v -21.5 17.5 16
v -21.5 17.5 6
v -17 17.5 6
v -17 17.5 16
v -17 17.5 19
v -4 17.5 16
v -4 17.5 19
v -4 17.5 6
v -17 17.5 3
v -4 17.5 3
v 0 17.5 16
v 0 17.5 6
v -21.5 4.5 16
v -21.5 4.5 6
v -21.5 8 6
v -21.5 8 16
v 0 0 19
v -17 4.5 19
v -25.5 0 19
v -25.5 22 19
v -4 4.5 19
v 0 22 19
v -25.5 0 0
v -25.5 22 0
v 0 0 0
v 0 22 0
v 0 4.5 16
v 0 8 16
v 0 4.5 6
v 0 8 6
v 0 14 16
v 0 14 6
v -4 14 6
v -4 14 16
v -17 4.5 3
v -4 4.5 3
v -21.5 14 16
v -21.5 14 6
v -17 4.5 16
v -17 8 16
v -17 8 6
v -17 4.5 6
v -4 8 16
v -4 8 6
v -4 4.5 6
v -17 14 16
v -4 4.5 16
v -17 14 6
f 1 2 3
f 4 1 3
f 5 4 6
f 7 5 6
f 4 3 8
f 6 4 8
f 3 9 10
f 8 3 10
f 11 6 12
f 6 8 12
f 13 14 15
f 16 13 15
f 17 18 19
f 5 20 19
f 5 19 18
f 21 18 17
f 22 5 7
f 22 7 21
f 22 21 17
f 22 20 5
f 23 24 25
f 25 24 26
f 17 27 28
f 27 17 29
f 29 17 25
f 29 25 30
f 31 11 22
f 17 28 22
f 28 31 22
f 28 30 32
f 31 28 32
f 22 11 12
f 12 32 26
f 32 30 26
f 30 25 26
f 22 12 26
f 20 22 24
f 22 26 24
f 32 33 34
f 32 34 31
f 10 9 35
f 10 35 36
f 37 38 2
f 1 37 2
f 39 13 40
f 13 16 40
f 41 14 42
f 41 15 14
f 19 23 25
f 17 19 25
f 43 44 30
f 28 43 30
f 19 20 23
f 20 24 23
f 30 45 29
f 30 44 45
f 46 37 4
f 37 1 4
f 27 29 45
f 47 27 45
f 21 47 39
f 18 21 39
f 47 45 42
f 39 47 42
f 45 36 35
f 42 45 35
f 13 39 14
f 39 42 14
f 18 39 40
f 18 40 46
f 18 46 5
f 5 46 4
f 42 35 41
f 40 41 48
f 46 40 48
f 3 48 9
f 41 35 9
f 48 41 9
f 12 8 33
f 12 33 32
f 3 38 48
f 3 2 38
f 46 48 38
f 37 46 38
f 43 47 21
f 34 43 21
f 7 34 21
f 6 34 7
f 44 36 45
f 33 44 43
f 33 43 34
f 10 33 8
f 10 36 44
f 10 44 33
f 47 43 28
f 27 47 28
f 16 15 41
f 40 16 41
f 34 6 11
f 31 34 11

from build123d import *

# Parameters (mm, degrees)
F0_W     = 4.5
F0_H     = 3
F1_DEPTH = 16
F2_DEPTH = 6
F3_DEPTH = 3
F0_W_2   = 4
F4_DEPTH = 16
F5_W     = 4.5
F5_H     = 3.5
F5_W_2   = 4
F5_H_2   = 13
F6_DEPTH = 3


with BuildPart() as f1:
    # F0 (on Top) → F1 (new body)
    with BuildSketch(Plane.XY):
        Polygon((-25.5, 22), (-25.5, 11), (-21.5, 11), (-17, 11), (-17, 14), (-21.5, 14), (-21.5, 14.5), (-21.5, 17.5), (-17, 17.5), (-4, 17.5), (0, 17.5), (0, 22), align=None)
        Polygon((-25.5, 0), (0, 0), (0, 4.5), (-4, 4.5), (-17, 4.5), (-21.5, 4.5), (-21.5, 7.5), (-21.5, 8), (-21.5, 11), (-25.5, 11), align=None)
        with Locations((-19.25, 9.5)):
            Rectangle(F0_W, F0_H)
    extrude(amount=F1_DEPTH)

    # F0 (on Top) → F2 (join)
    with BuildSketch(Plane.XY):
        Polygon((-21.5, 4.5), (-17, 4.5), (-17, 5), (-17, 7.5), (-17, 8), (-21.5, 8), (-21.5, 7.5), align=None)
        Polygon((-21.5, 14), (-17, 14), (-17, 14.5), (-17, 17), (-17, 17.5), (-21.5, 17.5), (-21.5, 14.5), align=None)
        Polygon((0, 17), (0, 17.5), (-4, 17.5), (-4, 17), (-4, 14), (0, 14), (0, 14.5), align=None)
        Polygon((-4, 4.5), (0, 4.5), (0, 5), (0, 7.5), (0, 8), (-4, 8), (-4, 7.5), (-4, 5), align=None)
    extrude(amount=F2_DEPTH)

    # F0 (on Top) → F3 (join)
    with BuildSketch(Plane.XY):
        Polygon((-17, 14), (-17, 11), (-16.5, 11), (-4, 11), (-4, 14), (-4, 17), (-4, 17.5), (-17, 17.5), (-17, 17), (-17, 14.5), align=None)
        Polygon((-17, 4.5), (-4, 4.5), (-4, 5), (-4, 7.5), (-4, 8), (-4, 11), (-16.5, 11), (-17, 11), (-17, 8), (-17, 7.5), (-17, 5), align=None)
    extrude(amount=F3_DEPTH)

    # F0 (on Top) → F4 (join)
    with BuildSketch(Plane.XY):
        with Locations((-2, 9.5)):
            Rectangle(F0_W_2, F0_H)
        with Locations((-2, 12.5)):
            Rectangle(F0_W_2, F0_H)
    extrude(amount=F4_DEPTH)

    # F5 (on face) → F6 (join)
    with BuildSketch(Plane.XY.offset(16)):
        with Locations((-19.25, 6.25)):
            Rectangle(F5_W, F5_H)
        with Locations((-19.25, 15.75)):
            Rectangle(F5_W, F5_H)
        with Locations((-2, 11)):
            Rectangle(F5_W_2, F5_H_2)
        Polygon((0, 4.5), (-4, 4.5), (-17, 4.5), (-21.5, 4.5), (-21.5, 8), (-17, 8), (-17, 14), (-21.5, 14), (-21.5, 17.5), (-17, 17.5), (-4, 17.5), (0, 17.5), (0, 22), (-25.5, 22), (-25.5, 0), (0, 0), align=None)
    extrude(amount=F6_DEPTH)


solid = f1.part
